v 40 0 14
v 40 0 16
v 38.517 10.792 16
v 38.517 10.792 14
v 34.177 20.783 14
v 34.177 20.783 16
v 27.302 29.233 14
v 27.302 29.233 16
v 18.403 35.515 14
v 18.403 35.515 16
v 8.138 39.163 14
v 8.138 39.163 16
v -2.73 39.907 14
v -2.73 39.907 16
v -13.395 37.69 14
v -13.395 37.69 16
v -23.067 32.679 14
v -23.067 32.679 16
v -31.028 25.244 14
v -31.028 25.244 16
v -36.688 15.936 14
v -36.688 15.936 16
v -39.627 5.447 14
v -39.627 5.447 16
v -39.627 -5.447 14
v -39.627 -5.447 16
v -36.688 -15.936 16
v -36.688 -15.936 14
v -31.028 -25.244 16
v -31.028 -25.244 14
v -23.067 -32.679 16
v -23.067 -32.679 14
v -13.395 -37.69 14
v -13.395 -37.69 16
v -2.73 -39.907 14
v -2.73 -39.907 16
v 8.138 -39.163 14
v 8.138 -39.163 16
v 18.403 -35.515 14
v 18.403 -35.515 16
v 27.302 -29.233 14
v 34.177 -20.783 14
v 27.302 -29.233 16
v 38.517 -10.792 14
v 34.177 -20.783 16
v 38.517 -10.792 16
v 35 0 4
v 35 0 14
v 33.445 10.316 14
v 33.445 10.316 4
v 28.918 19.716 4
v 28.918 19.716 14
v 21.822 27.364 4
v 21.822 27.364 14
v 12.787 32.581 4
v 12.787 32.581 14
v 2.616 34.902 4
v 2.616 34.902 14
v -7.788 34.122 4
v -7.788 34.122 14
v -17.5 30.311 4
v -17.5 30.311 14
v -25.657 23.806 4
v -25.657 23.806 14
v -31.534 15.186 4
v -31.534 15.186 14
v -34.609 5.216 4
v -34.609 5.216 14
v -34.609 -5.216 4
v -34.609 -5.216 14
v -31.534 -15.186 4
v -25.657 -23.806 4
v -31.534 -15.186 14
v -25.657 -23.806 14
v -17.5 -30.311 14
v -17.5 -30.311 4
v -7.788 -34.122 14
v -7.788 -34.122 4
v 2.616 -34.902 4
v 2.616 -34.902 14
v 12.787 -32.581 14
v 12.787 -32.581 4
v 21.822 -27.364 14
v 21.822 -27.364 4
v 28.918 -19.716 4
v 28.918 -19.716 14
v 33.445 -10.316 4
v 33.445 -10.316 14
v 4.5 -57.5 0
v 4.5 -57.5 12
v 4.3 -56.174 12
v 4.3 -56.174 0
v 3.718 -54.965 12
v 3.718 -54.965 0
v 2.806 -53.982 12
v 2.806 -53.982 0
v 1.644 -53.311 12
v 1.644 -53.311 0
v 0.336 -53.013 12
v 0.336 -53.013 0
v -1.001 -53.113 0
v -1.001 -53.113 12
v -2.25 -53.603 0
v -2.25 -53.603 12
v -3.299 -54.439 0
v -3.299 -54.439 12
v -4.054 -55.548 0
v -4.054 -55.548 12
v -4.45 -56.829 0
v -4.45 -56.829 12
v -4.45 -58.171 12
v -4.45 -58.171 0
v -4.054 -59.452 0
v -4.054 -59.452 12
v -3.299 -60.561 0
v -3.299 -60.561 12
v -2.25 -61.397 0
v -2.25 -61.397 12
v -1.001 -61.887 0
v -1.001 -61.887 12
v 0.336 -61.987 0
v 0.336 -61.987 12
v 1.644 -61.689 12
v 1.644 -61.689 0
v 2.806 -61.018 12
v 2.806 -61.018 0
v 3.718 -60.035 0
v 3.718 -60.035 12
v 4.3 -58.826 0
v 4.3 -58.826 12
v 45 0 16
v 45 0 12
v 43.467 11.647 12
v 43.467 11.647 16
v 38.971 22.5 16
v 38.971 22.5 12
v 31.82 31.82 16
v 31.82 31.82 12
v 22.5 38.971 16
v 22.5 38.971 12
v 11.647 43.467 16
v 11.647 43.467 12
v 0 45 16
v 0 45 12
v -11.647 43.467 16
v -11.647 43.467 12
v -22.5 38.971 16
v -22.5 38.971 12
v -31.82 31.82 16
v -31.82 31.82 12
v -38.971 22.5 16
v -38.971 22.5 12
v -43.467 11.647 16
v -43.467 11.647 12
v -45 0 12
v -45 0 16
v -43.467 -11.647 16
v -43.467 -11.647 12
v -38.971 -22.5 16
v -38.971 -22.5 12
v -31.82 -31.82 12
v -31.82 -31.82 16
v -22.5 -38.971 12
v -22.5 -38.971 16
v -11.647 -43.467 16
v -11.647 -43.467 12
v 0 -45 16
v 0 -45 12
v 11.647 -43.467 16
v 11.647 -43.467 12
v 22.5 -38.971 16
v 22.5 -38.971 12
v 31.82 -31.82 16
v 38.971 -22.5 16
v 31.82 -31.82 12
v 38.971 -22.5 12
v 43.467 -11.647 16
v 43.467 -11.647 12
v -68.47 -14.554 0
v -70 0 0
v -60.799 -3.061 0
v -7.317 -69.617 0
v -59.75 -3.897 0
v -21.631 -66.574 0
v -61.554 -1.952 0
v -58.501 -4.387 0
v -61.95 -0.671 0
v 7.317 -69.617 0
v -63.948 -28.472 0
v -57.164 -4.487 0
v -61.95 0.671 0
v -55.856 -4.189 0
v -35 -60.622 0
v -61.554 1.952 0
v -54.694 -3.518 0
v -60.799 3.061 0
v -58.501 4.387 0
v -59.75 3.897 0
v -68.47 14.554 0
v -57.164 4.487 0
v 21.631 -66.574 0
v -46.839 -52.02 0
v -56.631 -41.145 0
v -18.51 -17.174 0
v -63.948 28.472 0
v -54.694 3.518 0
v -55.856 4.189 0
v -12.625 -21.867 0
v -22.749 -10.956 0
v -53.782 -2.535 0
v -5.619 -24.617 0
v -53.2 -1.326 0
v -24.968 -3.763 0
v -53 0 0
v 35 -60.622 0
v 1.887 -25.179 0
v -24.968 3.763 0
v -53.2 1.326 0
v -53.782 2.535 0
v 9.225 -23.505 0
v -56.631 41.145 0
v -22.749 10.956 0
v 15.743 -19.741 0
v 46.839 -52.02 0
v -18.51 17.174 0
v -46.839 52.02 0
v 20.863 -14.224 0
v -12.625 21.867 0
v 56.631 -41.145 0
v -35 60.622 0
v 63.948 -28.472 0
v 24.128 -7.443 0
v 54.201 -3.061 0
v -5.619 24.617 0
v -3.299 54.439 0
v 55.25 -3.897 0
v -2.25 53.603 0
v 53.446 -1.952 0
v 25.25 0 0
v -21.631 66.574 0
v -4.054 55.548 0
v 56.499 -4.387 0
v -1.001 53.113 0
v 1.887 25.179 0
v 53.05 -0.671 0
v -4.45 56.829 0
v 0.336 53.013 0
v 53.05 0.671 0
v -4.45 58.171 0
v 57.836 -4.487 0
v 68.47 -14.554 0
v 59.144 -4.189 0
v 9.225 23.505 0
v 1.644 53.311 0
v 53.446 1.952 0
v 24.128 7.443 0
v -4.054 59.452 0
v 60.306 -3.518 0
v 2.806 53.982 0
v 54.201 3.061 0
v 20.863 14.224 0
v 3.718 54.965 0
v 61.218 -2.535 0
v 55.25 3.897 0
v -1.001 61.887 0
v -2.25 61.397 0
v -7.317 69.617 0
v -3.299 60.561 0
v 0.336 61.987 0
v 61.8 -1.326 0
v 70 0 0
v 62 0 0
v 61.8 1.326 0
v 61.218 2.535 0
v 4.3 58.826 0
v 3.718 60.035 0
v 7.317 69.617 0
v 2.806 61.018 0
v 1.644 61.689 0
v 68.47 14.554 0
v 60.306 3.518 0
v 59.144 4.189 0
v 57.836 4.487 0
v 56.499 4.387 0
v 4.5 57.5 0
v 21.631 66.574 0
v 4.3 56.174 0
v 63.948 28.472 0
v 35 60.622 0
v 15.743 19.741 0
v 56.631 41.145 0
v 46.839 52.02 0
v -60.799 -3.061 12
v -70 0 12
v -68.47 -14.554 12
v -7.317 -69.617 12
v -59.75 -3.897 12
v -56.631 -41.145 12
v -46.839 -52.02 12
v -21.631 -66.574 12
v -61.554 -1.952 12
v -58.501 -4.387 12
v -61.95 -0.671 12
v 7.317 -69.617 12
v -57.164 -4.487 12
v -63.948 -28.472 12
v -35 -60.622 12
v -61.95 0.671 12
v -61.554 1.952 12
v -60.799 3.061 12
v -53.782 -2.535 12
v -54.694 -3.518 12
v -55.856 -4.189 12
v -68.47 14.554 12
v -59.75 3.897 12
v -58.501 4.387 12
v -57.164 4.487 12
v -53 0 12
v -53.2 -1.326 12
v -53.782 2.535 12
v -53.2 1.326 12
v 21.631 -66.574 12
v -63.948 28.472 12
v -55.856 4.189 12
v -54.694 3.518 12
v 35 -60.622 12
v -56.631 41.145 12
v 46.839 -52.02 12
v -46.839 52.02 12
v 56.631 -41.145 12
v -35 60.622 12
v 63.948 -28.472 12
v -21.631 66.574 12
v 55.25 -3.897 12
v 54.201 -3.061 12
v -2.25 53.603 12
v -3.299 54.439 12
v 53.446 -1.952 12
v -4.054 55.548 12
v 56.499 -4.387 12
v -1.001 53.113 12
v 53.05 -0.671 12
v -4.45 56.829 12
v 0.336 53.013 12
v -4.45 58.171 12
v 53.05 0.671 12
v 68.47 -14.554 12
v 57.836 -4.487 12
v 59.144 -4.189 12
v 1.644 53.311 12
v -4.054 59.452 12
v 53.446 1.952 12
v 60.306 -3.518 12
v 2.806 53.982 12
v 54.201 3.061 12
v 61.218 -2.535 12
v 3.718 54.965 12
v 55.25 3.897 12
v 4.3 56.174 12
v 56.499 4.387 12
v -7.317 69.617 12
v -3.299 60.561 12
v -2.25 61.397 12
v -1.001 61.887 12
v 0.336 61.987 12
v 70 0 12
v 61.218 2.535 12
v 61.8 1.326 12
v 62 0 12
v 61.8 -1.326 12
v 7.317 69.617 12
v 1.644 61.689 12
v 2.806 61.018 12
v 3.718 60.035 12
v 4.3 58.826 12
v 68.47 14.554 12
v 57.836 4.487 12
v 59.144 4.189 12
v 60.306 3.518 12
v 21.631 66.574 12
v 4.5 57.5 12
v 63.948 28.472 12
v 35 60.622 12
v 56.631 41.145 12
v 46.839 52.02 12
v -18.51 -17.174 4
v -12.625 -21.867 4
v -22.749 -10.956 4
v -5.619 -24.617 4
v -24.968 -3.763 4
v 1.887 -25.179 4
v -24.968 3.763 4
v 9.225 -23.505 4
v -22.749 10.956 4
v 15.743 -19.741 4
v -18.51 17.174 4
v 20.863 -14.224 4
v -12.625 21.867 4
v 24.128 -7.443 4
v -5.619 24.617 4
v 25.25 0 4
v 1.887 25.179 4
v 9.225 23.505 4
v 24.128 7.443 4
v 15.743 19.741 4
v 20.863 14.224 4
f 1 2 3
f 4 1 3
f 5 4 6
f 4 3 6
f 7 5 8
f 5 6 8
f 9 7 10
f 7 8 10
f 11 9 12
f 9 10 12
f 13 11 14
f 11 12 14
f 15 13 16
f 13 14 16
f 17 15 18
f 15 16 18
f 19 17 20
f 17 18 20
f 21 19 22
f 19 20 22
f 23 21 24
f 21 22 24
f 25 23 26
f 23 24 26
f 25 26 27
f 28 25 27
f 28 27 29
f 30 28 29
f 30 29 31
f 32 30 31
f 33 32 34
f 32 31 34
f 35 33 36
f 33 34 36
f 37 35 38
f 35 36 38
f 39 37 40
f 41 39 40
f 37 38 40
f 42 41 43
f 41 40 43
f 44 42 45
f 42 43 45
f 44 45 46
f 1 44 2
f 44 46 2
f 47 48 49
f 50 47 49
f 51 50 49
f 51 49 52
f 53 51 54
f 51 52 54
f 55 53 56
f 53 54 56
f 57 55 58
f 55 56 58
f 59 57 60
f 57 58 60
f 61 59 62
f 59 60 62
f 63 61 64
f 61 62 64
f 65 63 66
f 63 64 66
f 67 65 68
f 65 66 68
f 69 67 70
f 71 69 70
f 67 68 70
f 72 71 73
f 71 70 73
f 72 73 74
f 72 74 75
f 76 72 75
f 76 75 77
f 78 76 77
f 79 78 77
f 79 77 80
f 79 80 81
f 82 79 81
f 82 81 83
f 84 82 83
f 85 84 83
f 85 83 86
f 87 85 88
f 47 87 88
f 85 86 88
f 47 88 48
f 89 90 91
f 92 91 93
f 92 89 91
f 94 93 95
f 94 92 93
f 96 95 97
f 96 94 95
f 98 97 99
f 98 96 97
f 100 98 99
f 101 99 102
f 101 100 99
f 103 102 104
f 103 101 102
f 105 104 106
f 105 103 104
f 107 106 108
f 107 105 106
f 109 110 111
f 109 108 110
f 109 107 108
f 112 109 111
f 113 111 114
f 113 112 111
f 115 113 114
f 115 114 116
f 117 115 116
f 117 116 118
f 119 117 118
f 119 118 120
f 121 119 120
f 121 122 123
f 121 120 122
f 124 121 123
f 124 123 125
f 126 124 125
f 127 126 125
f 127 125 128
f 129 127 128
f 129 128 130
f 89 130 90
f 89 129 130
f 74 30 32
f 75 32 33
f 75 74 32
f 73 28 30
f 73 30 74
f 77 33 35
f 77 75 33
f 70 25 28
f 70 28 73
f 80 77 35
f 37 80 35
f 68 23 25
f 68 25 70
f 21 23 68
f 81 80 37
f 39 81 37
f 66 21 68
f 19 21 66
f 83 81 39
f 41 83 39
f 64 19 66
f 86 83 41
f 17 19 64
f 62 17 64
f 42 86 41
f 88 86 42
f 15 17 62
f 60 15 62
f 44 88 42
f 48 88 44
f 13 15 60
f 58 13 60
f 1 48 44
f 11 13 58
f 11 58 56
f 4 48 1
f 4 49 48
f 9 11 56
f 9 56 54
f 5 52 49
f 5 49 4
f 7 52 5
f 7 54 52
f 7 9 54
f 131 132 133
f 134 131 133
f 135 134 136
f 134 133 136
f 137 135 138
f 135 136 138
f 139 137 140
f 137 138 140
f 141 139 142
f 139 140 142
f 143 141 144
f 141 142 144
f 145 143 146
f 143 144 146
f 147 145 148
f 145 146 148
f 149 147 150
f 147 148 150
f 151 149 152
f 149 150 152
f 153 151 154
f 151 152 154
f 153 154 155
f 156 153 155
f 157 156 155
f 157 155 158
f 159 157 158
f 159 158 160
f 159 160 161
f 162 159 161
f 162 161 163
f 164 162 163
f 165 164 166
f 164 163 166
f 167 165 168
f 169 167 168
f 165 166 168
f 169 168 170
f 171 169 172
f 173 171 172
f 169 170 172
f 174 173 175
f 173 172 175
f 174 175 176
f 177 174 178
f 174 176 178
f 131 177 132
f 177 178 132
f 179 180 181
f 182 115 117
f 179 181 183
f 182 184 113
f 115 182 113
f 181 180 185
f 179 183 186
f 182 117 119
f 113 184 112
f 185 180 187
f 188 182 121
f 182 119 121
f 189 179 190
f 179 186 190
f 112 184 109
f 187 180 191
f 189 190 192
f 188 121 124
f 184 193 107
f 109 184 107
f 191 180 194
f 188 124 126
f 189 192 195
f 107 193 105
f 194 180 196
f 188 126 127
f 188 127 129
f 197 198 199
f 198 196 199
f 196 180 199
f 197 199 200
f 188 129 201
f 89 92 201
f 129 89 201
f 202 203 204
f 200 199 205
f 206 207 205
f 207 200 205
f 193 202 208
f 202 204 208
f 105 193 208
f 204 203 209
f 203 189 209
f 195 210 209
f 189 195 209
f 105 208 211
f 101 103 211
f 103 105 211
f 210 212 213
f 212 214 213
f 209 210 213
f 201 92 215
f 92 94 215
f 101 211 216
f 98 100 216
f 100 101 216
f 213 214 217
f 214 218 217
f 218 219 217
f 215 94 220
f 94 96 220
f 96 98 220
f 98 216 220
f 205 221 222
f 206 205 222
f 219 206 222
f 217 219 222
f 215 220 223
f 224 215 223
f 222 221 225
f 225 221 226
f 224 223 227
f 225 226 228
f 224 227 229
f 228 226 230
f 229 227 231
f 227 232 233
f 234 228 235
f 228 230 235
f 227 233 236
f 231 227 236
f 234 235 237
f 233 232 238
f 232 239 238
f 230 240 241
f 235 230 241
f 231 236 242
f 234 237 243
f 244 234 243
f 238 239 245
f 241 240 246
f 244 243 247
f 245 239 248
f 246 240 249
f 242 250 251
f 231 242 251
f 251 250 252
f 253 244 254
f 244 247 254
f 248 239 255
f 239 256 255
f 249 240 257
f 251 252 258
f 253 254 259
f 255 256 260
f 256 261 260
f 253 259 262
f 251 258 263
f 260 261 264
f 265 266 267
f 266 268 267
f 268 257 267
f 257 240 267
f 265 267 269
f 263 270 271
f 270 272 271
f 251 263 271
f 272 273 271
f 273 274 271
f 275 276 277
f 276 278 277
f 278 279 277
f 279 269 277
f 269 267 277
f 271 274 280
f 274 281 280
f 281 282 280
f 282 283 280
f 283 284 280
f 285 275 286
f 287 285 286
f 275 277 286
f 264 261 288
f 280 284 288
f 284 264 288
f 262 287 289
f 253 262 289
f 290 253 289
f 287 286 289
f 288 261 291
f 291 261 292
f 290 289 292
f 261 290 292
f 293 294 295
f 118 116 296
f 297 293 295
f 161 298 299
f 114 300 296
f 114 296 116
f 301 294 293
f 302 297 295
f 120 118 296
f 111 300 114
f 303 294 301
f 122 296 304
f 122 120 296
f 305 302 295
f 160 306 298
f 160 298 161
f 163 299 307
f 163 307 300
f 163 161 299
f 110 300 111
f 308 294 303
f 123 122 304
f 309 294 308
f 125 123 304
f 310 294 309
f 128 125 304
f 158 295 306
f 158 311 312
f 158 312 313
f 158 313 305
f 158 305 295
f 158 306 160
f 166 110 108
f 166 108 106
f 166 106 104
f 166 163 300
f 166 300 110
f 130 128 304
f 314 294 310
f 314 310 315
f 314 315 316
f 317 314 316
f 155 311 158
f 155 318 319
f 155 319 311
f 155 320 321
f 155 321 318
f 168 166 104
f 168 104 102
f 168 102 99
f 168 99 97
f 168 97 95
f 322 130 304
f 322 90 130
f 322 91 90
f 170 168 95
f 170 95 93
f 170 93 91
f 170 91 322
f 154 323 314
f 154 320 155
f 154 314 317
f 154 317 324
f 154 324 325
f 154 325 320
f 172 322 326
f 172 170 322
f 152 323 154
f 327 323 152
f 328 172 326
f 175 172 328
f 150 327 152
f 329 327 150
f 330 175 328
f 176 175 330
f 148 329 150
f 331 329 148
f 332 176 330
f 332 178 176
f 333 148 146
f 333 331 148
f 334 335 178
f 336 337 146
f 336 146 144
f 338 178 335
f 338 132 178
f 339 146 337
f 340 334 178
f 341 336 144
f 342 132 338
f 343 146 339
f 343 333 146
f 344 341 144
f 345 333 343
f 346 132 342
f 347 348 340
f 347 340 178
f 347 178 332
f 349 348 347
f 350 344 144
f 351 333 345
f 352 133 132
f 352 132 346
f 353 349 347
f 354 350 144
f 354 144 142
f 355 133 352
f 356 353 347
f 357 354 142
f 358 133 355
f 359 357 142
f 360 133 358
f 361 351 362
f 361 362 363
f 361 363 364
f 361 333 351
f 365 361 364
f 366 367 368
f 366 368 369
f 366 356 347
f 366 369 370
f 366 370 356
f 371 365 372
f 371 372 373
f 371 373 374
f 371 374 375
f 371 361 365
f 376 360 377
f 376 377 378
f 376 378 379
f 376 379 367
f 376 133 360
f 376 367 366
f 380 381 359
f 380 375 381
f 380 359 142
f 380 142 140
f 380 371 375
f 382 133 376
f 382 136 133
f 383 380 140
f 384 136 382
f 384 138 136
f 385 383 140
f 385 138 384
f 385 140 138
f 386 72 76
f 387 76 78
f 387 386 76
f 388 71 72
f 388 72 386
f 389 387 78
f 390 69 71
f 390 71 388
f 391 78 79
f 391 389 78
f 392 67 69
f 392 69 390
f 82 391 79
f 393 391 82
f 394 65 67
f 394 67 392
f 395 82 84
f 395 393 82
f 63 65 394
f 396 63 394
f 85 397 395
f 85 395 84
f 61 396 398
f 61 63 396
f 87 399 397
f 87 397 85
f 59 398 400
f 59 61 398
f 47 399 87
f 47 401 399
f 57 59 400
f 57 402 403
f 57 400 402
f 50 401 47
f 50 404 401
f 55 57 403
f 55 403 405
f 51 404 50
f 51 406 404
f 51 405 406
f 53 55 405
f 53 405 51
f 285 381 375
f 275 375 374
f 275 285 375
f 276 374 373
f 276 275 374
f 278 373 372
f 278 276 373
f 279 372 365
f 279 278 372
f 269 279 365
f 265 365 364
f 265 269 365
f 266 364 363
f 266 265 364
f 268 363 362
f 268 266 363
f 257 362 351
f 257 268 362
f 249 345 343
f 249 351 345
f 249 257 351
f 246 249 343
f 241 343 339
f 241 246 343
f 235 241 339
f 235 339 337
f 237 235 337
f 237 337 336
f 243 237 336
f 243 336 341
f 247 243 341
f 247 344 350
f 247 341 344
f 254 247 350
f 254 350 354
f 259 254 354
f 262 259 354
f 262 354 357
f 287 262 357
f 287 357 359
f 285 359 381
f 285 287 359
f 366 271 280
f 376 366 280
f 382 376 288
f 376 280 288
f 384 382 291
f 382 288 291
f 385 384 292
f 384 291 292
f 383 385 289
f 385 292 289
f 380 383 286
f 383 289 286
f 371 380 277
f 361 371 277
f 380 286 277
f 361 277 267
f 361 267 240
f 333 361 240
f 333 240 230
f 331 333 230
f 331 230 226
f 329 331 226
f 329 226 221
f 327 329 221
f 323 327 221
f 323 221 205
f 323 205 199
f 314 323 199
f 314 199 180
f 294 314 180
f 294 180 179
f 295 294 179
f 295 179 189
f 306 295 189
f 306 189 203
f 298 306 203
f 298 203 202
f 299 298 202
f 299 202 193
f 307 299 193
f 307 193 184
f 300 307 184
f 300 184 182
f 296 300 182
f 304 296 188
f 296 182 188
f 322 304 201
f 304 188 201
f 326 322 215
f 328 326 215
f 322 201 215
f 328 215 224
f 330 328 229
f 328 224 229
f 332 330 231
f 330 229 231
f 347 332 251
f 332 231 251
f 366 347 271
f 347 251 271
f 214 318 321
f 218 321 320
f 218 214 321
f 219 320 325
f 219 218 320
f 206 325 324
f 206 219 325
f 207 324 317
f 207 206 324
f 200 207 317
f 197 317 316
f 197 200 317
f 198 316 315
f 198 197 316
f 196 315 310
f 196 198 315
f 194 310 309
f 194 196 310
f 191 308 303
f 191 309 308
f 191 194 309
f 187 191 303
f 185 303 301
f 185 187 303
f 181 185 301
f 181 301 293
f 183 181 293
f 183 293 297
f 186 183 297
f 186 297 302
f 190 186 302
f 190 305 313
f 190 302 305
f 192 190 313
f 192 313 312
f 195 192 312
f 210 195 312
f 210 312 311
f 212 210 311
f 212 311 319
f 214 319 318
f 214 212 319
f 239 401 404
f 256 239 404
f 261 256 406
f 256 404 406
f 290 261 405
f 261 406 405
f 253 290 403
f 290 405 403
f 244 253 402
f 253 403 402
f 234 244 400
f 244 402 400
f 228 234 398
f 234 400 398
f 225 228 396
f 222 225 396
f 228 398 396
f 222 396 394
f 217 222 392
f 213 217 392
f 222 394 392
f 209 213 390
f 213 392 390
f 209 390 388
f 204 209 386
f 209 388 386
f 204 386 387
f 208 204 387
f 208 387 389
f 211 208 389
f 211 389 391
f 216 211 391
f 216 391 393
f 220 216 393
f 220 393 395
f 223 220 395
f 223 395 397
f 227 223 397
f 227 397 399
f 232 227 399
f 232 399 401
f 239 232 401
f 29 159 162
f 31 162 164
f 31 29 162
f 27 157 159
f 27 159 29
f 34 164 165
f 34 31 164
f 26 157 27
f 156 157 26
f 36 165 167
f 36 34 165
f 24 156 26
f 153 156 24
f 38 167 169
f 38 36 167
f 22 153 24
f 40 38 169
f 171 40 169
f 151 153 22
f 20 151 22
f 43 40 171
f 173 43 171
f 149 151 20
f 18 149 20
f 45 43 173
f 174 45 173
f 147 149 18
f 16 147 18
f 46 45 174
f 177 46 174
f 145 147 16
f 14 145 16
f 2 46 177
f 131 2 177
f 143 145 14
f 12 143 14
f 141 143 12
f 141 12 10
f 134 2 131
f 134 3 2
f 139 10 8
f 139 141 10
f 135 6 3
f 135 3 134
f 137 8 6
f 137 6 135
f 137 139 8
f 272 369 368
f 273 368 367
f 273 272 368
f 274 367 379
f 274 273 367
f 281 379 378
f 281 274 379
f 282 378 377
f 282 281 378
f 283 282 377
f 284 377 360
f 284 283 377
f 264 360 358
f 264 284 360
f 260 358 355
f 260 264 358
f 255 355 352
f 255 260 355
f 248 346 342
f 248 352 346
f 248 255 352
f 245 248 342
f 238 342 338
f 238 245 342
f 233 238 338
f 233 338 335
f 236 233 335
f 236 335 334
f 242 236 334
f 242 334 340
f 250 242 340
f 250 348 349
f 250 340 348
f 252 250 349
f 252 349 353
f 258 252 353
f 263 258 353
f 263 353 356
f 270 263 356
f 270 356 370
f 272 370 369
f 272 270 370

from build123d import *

# Parameters (mm, degrees)
SKETCH1_R           = 70
SKETCH1_R_2         = 4.5
BOSS_EXTRUDE1_DEPTH = 16
CUT_EXTRUDE1_START  = -4
SKETCH2_R           = 70
SKETCH2_R_2         = 45
CUT_EXTRUDE1_DEPTH  = 4
SKETCH3_R           = 40
CUT_EXTRUDE2_DEPTH  = 2
SKETCH4_R           = 25.25
CUT_EXTRUDE3_DEPTH  = 24
SKETCH7_R           = 35
CUT_EXTRUDE5_DEPTH  = 10


with BuildPart() as part:
    # Sketch1 → Boss-Extrude1 (new body)
    with BuildSketch(Plane.XY):
        Circle(SKETCH1_R)
        with Locations((0, 57.5)):
            Circle(SKETCH1_R_2, mode=Mode.SUBTRACT)
        with Locations((57.5, 0)):
            Circle(SKETCH1_R_2, mode=Mode.SUBTRACT)
        with Locations((0, -57.5)):
            Circle(SKETCH1_R_2, mode=Mode.SUBTRACT)
        with Locations((-57.5, 0)):
            Circle(SKETCH1_R_2, mode=Mode.SUBTRACT)
    extrude(amount=BOSS_EXTRUDE1_DEPTH)

    # Sketch2 → Cut-Extrude1 (cut)
    with BuildSketch(Plane.XY.offset(16).offset(CUT_EXTRUDE1_START)):
        Circle(SKETCH2_R)
        Circle(SKETCH2_R_2, mode=Mode.SUBTRACT)
    extrude(amount=CUT_EXTRUDE1_DEPTH, mode=Mode.SUBTRACT)

    # Sketch3 → Cut-Extrude2 (cut)
    with BuildSketch(Plane.XY.offset(16)):
        Circle(SKETCH3_R)
    extrude(amount=-CUT_EXTRUDE2_DEPTH, mode=Mode.SUBTRACT)

    # Sketch4 → Cut-Extrude3 (cut)
    with BuildSketch(Plane.XY.offset(14)):
        Circle(SKETCH4_R)
    extrude(amount=-CUT_EXTRUDE3_DEPTH, mode=Mode.SUBTRACT)

    # Sketch7 → Cut-Extrude5 (cut)
    with BuildSketch(Plane.XY.offset(14)):
        Circle(SKETCH7_R)
    extrude(amount=-CUT_EXTRUDE5_DEPTH, mode=Mode.SUBTRACT)


solid = part.part
